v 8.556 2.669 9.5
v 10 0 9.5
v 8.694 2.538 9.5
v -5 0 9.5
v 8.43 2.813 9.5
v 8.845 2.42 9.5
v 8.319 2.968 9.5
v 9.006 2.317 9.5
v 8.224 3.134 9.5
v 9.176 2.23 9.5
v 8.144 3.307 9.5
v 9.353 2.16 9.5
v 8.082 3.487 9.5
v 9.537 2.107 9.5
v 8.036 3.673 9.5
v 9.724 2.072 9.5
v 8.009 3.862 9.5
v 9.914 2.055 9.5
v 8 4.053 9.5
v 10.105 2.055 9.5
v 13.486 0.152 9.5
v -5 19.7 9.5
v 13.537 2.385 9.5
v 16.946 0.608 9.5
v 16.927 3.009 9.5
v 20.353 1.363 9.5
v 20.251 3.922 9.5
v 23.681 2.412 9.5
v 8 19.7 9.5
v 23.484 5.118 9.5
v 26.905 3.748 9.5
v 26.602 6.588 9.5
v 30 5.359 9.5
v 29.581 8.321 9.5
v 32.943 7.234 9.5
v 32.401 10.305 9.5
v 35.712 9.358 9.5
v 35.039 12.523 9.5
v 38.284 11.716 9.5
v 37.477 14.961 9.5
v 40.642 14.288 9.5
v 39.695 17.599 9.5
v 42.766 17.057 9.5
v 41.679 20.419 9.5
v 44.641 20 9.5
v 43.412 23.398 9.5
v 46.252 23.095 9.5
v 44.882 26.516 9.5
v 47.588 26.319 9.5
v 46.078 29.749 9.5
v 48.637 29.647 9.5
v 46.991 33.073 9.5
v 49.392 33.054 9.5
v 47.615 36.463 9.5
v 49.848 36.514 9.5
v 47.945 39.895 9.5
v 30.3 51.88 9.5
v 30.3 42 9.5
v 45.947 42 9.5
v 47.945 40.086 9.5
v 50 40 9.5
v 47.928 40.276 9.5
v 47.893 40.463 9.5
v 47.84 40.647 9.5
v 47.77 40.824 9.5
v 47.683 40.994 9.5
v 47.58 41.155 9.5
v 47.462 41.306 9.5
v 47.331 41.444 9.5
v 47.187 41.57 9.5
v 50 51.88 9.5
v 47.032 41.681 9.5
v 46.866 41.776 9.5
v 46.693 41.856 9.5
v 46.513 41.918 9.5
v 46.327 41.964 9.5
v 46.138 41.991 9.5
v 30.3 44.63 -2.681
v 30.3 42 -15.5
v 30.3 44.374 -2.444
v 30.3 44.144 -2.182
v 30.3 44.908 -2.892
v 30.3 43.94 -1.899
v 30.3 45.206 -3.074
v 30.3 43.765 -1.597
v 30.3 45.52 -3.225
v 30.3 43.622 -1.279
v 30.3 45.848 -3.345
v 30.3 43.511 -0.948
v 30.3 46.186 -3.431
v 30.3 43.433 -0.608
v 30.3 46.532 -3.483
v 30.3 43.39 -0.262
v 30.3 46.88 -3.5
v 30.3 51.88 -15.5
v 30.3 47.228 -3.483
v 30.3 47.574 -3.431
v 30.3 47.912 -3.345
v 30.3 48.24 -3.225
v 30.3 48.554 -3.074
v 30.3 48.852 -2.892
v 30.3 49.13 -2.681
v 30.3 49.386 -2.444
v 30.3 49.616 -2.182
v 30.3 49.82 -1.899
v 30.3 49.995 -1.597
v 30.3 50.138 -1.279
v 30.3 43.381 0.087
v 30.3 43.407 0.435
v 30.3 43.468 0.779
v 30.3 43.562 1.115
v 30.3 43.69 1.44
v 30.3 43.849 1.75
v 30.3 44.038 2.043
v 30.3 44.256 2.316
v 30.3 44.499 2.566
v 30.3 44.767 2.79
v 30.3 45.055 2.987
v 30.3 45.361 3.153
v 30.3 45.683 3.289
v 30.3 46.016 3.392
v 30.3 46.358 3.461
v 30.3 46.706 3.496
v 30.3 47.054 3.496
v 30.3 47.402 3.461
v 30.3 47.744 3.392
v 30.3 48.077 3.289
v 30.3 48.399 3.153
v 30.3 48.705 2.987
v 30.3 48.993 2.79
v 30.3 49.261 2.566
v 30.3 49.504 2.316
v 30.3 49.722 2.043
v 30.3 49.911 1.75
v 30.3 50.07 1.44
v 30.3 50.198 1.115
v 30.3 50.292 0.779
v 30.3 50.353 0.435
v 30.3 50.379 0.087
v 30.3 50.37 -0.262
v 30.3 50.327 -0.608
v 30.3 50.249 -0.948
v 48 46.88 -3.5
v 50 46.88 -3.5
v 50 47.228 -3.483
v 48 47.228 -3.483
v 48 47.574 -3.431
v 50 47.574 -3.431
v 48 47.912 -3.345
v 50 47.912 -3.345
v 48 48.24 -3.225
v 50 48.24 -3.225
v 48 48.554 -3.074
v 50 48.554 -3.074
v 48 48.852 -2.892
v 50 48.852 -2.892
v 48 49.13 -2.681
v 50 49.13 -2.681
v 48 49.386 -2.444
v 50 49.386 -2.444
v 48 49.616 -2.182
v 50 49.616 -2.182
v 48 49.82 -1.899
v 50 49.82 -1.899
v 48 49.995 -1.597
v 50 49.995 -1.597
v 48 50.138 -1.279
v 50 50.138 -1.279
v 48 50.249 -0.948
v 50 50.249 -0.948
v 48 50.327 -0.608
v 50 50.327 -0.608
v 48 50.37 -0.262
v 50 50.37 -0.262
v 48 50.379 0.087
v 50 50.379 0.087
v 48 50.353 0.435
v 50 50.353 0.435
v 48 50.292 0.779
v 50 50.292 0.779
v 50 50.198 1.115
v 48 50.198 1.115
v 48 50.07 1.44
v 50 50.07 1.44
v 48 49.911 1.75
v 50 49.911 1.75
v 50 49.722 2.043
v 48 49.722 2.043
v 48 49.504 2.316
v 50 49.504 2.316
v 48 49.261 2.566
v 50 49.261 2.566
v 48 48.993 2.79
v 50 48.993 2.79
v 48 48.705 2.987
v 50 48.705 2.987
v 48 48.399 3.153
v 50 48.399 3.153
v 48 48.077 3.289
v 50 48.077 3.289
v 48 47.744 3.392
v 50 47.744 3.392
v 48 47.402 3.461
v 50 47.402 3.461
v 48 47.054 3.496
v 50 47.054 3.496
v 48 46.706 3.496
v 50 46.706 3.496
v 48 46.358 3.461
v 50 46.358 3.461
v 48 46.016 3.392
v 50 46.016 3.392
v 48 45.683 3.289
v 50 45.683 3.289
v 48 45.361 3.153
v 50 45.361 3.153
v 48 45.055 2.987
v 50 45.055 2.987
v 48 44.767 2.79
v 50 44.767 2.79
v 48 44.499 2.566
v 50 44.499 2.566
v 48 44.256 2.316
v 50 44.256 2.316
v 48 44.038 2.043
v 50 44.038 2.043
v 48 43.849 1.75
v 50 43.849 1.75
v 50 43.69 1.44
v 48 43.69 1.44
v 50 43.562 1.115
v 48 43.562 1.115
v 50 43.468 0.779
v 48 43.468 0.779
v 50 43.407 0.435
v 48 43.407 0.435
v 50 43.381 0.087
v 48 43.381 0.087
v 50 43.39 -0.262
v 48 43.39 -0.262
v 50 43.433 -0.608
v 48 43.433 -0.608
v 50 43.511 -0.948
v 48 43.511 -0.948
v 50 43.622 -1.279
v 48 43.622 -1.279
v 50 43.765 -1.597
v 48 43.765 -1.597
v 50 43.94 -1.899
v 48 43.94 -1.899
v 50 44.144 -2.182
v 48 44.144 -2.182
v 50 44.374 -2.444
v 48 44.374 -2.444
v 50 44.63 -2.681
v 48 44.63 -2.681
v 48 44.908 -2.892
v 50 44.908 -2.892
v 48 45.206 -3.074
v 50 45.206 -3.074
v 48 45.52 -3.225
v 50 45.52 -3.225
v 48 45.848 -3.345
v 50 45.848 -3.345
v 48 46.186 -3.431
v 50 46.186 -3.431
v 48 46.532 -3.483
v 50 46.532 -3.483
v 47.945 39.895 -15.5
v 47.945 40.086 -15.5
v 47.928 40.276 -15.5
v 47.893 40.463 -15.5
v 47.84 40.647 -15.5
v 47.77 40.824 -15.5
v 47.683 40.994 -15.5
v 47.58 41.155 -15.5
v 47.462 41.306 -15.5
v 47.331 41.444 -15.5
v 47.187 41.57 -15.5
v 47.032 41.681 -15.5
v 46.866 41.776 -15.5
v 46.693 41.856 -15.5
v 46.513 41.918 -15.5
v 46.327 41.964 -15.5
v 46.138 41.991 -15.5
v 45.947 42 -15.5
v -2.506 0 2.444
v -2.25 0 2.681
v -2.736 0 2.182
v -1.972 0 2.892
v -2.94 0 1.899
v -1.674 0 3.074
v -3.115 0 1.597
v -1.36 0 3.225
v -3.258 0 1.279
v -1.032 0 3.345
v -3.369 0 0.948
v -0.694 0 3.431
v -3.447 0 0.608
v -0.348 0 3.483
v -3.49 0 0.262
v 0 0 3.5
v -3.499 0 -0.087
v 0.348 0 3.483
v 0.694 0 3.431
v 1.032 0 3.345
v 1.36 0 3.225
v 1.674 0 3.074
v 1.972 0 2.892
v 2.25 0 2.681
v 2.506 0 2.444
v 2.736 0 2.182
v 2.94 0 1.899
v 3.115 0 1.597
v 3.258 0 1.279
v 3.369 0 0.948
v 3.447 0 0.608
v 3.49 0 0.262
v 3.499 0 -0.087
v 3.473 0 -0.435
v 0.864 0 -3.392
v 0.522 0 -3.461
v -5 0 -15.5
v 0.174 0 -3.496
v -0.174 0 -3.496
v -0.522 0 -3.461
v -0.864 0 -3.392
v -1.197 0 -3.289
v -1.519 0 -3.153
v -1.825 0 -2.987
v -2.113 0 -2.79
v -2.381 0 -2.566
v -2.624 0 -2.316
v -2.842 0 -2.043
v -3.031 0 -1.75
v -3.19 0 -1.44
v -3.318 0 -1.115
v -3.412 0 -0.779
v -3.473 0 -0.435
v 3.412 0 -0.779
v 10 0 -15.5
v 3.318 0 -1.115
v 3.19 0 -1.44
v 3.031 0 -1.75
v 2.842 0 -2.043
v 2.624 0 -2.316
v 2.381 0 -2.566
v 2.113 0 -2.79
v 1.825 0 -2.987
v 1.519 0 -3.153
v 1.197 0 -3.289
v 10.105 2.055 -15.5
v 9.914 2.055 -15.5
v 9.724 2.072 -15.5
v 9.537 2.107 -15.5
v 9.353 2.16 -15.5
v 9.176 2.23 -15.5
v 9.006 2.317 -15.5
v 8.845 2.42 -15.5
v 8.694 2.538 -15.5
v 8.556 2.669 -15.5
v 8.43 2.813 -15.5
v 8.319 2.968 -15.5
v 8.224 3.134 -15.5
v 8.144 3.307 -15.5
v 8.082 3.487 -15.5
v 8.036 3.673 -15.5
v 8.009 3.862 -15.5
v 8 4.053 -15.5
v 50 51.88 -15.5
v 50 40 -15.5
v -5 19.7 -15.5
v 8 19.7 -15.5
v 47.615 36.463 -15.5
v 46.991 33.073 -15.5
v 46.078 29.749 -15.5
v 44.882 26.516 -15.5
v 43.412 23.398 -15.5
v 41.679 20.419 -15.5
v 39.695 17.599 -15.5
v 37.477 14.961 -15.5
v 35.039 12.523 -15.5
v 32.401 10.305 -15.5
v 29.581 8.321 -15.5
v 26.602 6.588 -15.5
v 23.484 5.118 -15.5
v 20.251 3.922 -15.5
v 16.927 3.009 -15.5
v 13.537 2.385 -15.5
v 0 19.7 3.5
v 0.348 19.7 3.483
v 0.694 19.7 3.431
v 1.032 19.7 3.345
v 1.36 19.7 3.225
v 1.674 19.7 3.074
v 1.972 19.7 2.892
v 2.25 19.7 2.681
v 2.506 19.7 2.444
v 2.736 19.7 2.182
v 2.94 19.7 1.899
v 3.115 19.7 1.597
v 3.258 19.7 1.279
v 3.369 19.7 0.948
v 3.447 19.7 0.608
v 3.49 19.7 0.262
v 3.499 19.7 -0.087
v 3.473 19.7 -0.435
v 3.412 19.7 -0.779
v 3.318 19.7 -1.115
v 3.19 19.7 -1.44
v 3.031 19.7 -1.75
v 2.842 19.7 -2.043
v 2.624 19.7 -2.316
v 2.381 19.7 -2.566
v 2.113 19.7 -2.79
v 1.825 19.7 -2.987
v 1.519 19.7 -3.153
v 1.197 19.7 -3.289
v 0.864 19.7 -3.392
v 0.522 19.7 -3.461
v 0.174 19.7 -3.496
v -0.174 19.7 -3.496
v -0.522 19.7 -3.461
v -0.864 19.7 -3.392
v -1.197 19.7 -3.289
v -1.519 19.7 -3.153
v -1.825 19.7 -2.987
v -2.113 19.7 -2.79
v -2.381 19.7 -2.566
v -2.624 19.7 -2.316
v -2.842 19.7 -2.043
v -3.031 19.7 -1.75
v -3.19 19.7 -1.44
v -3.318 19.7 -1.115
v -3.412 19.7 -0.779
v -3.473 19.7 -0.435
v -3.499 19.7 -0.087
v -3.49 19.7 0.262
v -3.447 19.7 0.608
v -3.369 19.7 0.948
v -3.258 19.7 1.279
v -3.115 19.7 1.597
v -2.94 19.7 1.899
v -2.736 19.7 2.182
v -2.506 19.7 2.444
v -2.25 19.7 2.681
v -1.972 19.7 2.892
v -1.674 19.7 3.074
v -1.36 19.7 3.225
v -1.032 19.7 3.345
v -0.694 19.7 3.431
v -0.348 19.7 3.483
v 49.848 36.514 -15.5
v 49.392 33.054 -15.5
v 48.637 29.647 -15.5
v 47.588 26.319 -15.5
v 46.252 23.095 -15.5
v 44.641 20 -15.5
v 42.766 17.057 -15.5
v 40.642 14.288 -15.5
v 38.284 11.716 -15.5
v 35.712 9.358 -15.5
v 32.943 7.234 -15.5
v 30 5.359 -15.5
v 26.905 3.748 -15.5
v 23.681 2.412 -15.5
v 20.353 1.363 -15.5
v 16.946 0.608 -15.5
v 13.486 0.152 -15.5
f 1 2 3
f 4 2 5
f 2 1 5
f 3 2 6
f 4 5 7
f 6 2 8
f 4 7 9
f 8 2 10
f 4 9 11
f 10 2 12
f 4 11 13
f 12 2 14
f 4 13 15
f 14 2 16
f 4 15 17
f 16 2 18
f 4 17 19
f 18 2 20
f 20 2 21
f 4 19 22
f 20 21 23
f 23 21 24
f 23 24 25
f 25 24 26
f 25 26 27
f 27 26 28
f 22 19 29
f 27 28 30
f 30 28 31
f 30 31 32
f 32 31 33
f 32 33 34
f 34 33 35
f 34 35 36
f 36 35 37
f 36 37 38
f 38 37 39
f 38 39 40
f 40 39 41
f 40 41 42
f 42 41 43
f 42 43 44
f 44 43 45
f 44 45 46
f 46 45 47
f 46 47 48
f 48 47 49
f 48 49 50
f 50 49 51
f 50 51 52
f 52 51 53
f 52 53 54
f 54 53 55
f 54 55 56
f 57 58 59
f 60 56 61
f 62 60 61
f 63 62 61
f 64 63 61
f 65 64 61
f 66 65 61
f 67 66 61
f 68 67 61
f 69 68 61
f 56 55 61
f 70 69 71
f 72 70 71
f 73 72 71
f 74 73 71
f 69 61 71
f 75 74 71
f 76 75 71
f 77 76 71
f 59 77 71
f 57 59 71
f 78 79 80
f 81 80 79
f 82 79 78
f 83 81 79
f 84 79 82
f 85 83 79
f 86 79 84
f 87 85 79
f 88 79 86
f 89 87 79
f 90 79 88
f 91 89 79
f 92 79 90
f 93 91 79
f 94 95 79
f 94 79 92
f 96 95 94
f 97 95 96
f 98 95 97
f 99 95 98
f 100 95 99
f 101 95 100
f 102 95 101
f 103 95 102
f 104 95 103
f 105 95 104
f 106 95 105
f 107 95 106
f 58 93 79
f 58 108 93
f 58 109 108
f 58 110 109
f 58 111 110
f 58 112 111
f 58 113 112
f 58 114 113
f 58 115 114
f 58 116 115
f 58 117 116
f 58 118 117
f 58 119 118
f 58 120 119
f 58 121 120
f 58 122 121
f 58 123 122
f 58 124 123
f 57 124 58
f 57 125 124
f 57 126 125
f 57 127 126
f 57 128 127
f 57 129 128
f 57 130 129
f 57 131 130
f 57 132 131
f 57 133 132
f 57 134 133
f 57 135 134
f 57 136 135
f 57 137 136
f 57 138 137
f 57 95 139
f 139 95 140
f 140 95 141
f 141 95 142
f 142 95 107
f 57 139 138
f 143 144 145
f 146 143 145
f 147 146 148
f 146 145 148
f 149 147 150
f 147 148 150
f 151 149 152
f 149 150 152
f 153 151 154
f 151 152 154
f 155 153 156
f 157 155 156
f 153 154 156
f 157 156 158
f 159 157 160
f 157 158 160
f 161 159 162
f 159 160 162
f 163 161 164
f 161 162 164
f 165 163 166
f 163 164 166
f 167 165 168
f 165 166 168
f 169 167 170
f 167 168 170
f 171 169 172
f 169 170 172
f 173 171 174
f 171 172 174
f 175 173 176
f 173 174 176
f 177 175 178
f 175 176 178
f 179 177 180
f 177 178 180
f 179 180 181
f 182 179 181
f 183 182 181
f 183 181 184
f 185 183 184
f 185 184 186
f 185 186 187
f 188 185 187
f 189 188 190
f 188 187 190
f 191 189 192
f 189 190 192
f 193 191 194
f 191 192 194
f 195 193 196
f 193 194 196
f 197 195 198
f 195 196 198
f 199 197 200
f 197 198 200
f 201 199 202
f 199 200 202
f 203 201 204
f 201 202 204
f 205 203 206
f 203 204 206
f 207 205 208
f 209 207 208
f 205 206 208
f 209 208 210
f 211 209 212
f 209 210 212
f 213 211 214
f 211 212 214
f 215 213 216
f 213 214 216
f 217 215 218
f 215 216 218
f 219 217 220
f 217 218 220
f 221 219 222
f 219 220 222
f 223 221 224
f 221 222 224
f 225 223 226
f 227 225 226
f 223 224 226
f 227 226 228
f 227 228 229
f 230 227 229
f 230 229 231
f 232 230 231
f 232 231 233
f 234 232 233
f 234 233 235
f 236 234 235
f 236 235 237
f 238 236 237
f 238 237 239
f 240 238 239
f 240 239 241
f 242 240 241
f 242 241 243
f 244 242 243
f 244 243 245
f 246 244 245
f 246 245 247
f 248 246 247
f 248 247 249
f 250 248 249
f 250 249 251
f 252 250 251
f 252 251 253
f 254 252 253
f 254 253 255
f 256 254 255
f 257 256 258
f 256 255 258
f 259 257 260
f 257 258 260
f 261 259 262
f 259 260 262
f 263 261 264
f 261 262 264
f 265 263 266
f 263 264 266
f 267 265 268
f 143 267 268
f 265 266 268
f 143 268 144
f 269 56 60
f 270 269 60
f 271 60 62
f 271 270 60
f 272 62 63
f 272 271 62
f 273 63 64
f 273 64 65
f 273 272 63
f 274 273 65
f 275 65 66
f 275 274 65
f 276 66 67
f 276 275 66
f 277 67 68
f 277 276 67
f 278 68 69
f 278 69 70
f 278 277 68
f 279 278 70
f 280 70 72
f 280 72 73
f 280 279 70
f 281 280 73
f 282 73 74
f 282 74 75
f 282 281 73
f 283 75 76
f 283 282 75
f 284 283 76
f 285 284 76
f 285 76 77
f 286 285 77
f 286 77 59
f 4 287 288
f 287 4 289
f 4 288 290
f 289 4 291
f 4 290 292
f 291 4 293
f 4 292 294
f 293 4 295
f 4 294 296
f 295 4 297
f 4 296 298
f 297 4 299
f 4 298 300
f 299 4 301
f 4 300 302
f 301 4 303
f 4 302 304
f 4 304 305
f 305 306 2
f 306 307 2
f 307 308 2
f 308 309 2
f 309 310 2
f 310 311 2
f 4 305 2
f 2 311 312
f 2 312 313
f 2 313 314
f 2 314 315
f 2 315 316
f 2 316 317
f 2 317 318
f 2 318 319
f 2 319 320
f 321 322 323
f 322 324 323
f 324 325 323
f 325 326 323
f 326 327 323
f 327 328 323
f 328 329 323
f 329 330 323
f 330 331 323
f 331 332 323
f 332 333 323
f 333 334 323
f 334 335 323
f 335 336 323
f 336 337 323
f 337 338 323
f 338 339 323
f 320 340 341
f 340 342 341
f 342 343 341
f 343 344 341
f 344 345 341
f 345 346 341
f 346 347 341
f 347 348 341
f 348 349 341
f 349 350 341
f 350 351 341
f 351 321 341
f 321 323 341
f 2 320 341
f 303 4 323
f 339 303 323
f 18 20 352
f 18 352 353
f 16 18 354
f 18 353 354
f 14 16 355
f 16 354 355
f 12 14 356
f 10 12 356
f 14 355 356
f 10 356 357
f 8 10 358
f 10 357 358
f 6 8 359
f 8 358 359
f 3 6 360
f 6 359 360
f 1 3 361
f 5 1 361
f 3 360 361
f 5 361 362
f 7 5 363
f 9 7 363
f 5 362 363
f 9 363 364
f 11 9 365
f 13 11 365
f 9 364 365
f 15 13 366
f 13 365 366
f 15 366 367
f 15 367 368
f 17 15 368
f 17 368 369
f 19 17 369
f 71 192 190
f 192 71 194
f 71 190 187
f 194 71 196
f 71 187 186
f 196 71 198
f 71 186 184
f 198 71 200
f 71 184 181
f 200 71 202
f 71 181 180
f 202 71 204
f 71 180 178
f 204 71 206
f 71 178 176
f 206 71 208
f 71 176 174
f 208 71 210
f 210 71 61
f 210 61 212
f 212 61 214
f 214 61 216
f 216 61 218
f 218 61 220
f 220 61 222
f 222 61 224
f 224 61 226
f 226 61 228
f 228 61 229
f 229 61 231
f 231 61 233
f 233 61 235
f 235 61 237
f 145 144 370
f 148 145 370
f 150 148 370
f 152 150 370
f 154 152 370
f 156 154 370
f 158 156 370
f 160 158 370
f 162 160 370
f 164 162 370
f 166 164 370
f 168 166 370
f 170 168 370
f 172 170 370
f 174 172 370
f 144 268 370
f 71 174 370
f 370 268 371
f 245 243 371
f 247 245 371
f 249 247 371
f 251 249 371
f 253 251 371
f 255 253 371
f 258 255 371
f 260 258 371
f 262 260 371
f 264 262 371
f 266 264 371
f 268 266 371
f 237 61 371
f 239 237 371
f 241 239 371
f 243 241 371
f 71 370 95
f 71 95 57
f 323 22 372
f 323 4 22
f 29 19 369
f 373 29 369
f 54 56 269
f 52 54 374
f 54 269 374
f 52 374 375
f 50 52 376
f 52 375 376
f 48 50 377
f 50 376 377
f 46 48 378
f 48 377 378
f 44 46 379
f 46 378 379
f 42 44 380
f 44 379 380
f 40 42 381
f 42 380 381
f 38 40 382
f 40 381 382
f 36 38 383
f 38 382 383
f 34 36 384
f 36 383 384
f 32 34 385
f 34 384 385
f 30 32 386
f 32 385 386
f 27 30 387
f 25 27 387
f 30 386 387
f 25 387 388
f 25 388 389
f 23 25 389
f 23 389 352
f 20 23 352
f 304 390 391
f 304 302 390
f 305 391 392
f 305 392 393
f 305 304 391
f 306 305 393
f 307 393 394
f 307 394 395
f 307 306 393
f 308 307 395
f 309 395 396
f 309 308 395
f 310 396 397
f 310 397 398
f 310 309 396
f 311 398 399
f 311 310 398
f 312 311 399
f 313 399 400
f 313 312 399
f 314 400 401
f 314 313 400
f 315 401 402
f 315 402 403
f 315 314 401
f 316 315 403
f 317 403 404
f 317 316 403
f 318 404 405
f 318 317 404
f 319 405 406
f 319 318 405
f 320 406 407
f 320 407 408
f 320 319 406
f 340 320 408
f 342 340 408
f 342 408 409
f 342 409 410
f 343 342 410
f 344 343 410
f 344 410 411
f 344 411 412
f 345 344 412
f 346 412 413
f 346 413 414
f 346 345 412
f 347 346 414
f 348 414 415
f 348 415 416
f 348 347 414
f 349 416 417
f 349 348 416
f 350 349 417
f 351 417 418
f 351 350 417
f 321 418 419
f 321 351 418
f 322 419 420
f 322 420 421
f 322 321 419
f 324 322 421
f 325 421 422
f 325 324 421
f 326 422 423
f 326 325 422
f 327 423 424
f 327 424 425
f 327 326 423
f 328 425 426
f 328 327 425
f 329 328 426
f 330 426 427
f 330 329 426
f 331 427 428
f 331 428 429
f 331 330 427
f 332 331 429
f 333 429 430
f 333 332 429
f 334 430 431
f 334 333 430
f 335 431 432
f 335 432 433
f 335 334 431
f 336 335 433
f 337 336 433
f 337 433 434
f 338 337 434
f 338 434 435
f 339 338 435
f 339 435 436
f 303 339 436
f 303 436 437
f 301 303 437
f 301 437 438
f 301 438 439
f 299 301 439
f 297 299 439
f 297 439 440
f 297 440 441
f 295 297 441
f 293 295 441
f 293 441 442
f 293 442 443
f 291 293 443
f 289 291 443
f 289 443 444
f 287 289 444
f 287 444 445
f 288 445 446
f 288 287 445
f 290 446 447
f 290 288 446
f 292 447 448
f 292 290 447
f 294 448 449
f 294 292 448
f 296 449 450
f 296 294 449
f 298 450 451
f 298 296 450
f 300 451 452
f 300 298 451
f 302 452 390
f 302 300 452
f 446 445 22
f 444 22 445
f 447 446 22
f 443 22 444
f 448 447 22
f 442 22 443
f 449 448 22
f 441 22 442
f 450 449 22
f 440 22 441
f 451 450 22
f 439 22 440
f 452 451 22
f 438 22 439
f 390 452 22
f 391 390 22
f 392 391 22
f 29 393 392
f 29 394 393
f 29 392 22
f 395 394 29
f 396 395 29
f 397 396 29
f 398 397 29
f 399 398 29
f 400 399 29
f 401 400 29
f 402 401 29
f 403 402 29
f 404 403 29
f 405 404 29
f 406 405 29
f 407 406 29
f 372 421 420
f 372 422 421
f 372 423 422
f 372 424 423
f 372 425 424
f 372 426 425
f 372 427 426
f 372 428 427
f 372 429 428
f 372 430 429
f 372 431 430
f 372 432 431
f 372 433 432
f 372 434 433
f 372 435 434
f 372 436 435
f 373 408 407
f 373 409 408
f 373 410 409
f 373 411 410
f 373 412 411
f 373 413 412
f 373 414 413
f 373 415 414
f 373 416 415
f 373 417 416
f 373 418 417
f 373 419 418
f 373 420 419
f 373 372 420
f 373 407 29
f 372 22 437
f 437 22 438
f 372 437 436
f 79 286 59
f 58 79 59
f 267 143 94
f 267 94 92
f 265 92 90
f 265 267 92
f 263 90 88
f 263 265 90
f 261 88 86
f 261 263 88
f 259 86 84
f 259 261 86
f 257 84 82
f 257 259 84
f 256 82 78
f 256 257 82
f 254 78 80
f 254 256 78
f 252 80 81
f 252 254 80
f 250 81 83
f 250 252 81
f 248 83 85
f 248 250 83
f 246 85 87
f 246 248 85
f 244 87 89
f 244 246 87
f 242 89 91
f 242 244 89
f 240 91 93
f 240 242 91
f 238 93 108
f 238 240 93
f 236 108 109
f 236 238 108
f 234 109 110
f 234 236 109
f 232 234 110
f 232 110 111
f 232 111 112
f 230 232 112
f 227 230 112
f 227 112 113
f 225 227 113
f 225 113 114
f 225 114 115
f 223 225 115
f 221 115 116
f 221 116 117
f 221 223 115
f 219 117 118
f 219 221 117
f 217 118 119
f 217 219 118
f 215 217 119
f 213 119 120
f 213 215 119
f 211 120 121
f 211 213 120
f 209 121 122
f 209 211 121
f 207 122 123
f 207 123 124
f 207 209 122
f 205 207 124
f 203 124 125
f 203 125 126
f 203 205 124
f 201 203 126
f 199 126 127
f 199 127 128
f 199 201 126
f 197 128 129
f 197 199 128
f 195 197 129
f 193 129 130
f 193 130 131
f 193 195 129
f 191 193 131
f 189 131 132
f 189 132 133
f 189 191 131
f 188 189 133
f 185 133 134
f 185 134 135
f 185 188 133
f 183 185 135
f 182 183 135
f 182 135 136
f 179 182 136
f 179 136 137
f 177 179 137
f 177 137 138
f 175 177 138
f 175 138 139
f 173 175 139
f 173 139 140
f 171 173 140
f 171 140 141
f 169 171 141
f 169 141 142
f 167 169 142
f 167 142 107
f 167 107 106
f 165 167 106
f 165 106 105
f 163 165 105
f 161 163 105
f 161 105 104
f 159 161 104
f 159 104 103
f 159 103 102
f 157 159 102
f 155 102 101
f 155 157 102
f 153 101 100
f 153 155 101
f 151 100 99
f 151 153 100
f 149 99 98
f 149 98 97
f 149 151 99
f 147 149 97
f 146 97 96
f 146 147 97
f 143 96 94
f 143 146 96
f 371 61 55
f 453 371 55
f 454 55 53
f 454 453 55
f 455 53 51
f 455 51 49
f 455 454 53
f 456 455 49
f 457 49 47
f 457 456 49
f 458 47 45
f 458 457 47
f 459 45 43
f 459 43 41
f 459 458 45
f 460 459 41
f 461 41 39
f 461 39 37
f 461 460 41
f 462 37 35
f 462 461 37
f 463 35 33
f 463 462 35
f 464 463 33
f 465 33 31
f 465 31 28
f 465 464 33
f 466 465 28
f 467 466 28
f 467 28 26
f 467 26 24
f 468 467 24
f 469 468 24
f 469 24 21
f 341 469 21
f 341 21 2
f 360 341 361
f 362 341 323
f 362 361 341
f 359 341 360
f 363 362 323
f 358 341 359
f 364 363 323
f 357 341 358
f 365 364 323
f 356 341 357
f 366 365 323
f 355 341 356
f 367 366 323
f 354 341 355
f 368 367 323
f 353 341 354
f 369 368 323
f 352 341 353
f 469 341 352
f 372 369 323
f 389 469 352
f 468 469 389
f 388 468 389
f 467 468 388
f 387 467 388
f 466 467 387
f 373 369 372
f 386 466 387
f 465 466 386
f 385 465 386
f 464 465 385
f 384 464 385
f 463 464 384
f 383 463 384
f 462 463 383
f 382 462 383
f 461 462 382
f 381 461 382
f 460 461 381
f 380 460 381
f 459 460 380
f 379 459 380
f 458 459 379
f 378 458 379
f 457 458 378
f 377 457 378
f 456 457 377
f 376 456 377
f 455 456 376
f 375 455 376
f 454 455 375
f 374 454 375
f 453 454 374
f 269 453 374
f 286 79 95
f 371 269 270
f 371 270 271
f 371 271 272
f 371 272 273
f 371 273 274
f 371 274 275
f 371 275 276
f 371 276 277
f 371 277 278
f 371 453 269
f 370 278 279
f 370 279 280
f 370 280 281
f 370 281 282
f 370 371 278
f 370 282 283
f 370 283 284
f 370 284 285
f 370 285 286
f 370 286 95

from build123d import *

# Parameters (mm, degrees)
SKETCH1_W           = 55
SKETCH1_H           = 25
SKETCH1_R           = 3.5
BOSS_EXTRUDE1_DEPTH = 2
SKETCH2_W           = 25
SKETCH2_H           = 51.88
SKETCH2_R           = 3.5
BOSS_EXTRUDE2_DEPTH = 2
FILLET2_R           = 40
SKETCH5_W           = 13
SKETCH5_H           = 25
SKETCH5_R           = 3.5
BOSS_EXTRUDE5_DEPTH = 17.7
SKETCH6_W           = 25
SKETCH6_H           = 9.88
SKETCH6_R           = 3.5
BOSS_EXTRUDE6_DEPTH = 17.7
FILLET3_R           = 2
FILLET4_R           = 2


with BuildPart() as part:
    # Sketch1 → Boss-Extrude1 (new body)
    with BuildSketch(Plane(origin=(0, 0, 0), x_dir=(1, 0, 0), z_dir=(0, 1, 0))):
        with Locations((22.5, 3)):
            Rectangle(SKETCH1_W, SKETCH1_H)
        with Locations(Location((0, 0, 0), (0, 0, 270))):
            Circle(SKETCH1_R, mode=Mode.SUBTRACT)
    extrude(amount=BOSS_EXTRUDE1_DEPTH)

    # Sketch2 → Boss-Extrude2 (add)
    with BuildSketch(Plane(origin=(50, 0, 0), x_dir=(0, 0, -1), z_dir=(1, 0, 0))):
        with Locations((3, 25.94)):
            Rectangle(SKETCH2_W, SKETCH2_H)
        with Locations((0, 46.88)):
            Circle(SKETCH2_R, mode=Mode.SUBTRACT)
    extrude(amount=-BOSS_EXTRUDE2_DEPTH)

    # Fillet2
    fillet2_edges = [part.edges().sort_by_distance(p)[0] for p in [
        (48, 2, -3),
        (50, 0, -3),
    ]]
    fillet(fillet2_edges, radius=FILLET2_R)

    # Sketch5 → Boss-Extrude5 (add)
    with BuildSketch(Plane(origin=(0, 2, 0), x_dir=(1, 0, 0), z_dir=(0, 1, 0))):
        with Locations((1.5, 3)):
            Rectangle(SKETCH5_W, SKETCH5_H)
        with Locations(Location((0, 0, 0), (0, 0, 270))):
            Circle(SKETCH5_R, mode=Mode.SUBTRACT)
    extrude(amount=BOSS_EXTRUDE5_DEPTH)

    # Sketch6 → Boss-Extrude6 (add)
    with BuildSketch(Plane.ZY.offset(-48)):
        with Locations((-3, 46.94)):
            Rectangle(SKETCH6_W, SKETCH6_H)
        with Locations(Location((0, 46.88, 0), (0, 0, 180))):
            Circle(SKETCH6_R, mode=Mode.SUBTRACT)
    extrude(amount=BOSS_EXTRUDE6_DEPTH)

    # Fillet3
    fillet3_edges = [part.edges().sort_by_distance(p)[0] for p in [
        (48, 42, -3),
    ]]
    fillet(fillet3_edges, radius=FILLET3_R)

    # Fillet4
    fillet4_edges = [part.edges().sort_by_distance(p)[0] for p in [
        (8, 2, -3),
    ]]
    fillet(fillet4_edges, radius=FILLET4_R)


solid = part.part
